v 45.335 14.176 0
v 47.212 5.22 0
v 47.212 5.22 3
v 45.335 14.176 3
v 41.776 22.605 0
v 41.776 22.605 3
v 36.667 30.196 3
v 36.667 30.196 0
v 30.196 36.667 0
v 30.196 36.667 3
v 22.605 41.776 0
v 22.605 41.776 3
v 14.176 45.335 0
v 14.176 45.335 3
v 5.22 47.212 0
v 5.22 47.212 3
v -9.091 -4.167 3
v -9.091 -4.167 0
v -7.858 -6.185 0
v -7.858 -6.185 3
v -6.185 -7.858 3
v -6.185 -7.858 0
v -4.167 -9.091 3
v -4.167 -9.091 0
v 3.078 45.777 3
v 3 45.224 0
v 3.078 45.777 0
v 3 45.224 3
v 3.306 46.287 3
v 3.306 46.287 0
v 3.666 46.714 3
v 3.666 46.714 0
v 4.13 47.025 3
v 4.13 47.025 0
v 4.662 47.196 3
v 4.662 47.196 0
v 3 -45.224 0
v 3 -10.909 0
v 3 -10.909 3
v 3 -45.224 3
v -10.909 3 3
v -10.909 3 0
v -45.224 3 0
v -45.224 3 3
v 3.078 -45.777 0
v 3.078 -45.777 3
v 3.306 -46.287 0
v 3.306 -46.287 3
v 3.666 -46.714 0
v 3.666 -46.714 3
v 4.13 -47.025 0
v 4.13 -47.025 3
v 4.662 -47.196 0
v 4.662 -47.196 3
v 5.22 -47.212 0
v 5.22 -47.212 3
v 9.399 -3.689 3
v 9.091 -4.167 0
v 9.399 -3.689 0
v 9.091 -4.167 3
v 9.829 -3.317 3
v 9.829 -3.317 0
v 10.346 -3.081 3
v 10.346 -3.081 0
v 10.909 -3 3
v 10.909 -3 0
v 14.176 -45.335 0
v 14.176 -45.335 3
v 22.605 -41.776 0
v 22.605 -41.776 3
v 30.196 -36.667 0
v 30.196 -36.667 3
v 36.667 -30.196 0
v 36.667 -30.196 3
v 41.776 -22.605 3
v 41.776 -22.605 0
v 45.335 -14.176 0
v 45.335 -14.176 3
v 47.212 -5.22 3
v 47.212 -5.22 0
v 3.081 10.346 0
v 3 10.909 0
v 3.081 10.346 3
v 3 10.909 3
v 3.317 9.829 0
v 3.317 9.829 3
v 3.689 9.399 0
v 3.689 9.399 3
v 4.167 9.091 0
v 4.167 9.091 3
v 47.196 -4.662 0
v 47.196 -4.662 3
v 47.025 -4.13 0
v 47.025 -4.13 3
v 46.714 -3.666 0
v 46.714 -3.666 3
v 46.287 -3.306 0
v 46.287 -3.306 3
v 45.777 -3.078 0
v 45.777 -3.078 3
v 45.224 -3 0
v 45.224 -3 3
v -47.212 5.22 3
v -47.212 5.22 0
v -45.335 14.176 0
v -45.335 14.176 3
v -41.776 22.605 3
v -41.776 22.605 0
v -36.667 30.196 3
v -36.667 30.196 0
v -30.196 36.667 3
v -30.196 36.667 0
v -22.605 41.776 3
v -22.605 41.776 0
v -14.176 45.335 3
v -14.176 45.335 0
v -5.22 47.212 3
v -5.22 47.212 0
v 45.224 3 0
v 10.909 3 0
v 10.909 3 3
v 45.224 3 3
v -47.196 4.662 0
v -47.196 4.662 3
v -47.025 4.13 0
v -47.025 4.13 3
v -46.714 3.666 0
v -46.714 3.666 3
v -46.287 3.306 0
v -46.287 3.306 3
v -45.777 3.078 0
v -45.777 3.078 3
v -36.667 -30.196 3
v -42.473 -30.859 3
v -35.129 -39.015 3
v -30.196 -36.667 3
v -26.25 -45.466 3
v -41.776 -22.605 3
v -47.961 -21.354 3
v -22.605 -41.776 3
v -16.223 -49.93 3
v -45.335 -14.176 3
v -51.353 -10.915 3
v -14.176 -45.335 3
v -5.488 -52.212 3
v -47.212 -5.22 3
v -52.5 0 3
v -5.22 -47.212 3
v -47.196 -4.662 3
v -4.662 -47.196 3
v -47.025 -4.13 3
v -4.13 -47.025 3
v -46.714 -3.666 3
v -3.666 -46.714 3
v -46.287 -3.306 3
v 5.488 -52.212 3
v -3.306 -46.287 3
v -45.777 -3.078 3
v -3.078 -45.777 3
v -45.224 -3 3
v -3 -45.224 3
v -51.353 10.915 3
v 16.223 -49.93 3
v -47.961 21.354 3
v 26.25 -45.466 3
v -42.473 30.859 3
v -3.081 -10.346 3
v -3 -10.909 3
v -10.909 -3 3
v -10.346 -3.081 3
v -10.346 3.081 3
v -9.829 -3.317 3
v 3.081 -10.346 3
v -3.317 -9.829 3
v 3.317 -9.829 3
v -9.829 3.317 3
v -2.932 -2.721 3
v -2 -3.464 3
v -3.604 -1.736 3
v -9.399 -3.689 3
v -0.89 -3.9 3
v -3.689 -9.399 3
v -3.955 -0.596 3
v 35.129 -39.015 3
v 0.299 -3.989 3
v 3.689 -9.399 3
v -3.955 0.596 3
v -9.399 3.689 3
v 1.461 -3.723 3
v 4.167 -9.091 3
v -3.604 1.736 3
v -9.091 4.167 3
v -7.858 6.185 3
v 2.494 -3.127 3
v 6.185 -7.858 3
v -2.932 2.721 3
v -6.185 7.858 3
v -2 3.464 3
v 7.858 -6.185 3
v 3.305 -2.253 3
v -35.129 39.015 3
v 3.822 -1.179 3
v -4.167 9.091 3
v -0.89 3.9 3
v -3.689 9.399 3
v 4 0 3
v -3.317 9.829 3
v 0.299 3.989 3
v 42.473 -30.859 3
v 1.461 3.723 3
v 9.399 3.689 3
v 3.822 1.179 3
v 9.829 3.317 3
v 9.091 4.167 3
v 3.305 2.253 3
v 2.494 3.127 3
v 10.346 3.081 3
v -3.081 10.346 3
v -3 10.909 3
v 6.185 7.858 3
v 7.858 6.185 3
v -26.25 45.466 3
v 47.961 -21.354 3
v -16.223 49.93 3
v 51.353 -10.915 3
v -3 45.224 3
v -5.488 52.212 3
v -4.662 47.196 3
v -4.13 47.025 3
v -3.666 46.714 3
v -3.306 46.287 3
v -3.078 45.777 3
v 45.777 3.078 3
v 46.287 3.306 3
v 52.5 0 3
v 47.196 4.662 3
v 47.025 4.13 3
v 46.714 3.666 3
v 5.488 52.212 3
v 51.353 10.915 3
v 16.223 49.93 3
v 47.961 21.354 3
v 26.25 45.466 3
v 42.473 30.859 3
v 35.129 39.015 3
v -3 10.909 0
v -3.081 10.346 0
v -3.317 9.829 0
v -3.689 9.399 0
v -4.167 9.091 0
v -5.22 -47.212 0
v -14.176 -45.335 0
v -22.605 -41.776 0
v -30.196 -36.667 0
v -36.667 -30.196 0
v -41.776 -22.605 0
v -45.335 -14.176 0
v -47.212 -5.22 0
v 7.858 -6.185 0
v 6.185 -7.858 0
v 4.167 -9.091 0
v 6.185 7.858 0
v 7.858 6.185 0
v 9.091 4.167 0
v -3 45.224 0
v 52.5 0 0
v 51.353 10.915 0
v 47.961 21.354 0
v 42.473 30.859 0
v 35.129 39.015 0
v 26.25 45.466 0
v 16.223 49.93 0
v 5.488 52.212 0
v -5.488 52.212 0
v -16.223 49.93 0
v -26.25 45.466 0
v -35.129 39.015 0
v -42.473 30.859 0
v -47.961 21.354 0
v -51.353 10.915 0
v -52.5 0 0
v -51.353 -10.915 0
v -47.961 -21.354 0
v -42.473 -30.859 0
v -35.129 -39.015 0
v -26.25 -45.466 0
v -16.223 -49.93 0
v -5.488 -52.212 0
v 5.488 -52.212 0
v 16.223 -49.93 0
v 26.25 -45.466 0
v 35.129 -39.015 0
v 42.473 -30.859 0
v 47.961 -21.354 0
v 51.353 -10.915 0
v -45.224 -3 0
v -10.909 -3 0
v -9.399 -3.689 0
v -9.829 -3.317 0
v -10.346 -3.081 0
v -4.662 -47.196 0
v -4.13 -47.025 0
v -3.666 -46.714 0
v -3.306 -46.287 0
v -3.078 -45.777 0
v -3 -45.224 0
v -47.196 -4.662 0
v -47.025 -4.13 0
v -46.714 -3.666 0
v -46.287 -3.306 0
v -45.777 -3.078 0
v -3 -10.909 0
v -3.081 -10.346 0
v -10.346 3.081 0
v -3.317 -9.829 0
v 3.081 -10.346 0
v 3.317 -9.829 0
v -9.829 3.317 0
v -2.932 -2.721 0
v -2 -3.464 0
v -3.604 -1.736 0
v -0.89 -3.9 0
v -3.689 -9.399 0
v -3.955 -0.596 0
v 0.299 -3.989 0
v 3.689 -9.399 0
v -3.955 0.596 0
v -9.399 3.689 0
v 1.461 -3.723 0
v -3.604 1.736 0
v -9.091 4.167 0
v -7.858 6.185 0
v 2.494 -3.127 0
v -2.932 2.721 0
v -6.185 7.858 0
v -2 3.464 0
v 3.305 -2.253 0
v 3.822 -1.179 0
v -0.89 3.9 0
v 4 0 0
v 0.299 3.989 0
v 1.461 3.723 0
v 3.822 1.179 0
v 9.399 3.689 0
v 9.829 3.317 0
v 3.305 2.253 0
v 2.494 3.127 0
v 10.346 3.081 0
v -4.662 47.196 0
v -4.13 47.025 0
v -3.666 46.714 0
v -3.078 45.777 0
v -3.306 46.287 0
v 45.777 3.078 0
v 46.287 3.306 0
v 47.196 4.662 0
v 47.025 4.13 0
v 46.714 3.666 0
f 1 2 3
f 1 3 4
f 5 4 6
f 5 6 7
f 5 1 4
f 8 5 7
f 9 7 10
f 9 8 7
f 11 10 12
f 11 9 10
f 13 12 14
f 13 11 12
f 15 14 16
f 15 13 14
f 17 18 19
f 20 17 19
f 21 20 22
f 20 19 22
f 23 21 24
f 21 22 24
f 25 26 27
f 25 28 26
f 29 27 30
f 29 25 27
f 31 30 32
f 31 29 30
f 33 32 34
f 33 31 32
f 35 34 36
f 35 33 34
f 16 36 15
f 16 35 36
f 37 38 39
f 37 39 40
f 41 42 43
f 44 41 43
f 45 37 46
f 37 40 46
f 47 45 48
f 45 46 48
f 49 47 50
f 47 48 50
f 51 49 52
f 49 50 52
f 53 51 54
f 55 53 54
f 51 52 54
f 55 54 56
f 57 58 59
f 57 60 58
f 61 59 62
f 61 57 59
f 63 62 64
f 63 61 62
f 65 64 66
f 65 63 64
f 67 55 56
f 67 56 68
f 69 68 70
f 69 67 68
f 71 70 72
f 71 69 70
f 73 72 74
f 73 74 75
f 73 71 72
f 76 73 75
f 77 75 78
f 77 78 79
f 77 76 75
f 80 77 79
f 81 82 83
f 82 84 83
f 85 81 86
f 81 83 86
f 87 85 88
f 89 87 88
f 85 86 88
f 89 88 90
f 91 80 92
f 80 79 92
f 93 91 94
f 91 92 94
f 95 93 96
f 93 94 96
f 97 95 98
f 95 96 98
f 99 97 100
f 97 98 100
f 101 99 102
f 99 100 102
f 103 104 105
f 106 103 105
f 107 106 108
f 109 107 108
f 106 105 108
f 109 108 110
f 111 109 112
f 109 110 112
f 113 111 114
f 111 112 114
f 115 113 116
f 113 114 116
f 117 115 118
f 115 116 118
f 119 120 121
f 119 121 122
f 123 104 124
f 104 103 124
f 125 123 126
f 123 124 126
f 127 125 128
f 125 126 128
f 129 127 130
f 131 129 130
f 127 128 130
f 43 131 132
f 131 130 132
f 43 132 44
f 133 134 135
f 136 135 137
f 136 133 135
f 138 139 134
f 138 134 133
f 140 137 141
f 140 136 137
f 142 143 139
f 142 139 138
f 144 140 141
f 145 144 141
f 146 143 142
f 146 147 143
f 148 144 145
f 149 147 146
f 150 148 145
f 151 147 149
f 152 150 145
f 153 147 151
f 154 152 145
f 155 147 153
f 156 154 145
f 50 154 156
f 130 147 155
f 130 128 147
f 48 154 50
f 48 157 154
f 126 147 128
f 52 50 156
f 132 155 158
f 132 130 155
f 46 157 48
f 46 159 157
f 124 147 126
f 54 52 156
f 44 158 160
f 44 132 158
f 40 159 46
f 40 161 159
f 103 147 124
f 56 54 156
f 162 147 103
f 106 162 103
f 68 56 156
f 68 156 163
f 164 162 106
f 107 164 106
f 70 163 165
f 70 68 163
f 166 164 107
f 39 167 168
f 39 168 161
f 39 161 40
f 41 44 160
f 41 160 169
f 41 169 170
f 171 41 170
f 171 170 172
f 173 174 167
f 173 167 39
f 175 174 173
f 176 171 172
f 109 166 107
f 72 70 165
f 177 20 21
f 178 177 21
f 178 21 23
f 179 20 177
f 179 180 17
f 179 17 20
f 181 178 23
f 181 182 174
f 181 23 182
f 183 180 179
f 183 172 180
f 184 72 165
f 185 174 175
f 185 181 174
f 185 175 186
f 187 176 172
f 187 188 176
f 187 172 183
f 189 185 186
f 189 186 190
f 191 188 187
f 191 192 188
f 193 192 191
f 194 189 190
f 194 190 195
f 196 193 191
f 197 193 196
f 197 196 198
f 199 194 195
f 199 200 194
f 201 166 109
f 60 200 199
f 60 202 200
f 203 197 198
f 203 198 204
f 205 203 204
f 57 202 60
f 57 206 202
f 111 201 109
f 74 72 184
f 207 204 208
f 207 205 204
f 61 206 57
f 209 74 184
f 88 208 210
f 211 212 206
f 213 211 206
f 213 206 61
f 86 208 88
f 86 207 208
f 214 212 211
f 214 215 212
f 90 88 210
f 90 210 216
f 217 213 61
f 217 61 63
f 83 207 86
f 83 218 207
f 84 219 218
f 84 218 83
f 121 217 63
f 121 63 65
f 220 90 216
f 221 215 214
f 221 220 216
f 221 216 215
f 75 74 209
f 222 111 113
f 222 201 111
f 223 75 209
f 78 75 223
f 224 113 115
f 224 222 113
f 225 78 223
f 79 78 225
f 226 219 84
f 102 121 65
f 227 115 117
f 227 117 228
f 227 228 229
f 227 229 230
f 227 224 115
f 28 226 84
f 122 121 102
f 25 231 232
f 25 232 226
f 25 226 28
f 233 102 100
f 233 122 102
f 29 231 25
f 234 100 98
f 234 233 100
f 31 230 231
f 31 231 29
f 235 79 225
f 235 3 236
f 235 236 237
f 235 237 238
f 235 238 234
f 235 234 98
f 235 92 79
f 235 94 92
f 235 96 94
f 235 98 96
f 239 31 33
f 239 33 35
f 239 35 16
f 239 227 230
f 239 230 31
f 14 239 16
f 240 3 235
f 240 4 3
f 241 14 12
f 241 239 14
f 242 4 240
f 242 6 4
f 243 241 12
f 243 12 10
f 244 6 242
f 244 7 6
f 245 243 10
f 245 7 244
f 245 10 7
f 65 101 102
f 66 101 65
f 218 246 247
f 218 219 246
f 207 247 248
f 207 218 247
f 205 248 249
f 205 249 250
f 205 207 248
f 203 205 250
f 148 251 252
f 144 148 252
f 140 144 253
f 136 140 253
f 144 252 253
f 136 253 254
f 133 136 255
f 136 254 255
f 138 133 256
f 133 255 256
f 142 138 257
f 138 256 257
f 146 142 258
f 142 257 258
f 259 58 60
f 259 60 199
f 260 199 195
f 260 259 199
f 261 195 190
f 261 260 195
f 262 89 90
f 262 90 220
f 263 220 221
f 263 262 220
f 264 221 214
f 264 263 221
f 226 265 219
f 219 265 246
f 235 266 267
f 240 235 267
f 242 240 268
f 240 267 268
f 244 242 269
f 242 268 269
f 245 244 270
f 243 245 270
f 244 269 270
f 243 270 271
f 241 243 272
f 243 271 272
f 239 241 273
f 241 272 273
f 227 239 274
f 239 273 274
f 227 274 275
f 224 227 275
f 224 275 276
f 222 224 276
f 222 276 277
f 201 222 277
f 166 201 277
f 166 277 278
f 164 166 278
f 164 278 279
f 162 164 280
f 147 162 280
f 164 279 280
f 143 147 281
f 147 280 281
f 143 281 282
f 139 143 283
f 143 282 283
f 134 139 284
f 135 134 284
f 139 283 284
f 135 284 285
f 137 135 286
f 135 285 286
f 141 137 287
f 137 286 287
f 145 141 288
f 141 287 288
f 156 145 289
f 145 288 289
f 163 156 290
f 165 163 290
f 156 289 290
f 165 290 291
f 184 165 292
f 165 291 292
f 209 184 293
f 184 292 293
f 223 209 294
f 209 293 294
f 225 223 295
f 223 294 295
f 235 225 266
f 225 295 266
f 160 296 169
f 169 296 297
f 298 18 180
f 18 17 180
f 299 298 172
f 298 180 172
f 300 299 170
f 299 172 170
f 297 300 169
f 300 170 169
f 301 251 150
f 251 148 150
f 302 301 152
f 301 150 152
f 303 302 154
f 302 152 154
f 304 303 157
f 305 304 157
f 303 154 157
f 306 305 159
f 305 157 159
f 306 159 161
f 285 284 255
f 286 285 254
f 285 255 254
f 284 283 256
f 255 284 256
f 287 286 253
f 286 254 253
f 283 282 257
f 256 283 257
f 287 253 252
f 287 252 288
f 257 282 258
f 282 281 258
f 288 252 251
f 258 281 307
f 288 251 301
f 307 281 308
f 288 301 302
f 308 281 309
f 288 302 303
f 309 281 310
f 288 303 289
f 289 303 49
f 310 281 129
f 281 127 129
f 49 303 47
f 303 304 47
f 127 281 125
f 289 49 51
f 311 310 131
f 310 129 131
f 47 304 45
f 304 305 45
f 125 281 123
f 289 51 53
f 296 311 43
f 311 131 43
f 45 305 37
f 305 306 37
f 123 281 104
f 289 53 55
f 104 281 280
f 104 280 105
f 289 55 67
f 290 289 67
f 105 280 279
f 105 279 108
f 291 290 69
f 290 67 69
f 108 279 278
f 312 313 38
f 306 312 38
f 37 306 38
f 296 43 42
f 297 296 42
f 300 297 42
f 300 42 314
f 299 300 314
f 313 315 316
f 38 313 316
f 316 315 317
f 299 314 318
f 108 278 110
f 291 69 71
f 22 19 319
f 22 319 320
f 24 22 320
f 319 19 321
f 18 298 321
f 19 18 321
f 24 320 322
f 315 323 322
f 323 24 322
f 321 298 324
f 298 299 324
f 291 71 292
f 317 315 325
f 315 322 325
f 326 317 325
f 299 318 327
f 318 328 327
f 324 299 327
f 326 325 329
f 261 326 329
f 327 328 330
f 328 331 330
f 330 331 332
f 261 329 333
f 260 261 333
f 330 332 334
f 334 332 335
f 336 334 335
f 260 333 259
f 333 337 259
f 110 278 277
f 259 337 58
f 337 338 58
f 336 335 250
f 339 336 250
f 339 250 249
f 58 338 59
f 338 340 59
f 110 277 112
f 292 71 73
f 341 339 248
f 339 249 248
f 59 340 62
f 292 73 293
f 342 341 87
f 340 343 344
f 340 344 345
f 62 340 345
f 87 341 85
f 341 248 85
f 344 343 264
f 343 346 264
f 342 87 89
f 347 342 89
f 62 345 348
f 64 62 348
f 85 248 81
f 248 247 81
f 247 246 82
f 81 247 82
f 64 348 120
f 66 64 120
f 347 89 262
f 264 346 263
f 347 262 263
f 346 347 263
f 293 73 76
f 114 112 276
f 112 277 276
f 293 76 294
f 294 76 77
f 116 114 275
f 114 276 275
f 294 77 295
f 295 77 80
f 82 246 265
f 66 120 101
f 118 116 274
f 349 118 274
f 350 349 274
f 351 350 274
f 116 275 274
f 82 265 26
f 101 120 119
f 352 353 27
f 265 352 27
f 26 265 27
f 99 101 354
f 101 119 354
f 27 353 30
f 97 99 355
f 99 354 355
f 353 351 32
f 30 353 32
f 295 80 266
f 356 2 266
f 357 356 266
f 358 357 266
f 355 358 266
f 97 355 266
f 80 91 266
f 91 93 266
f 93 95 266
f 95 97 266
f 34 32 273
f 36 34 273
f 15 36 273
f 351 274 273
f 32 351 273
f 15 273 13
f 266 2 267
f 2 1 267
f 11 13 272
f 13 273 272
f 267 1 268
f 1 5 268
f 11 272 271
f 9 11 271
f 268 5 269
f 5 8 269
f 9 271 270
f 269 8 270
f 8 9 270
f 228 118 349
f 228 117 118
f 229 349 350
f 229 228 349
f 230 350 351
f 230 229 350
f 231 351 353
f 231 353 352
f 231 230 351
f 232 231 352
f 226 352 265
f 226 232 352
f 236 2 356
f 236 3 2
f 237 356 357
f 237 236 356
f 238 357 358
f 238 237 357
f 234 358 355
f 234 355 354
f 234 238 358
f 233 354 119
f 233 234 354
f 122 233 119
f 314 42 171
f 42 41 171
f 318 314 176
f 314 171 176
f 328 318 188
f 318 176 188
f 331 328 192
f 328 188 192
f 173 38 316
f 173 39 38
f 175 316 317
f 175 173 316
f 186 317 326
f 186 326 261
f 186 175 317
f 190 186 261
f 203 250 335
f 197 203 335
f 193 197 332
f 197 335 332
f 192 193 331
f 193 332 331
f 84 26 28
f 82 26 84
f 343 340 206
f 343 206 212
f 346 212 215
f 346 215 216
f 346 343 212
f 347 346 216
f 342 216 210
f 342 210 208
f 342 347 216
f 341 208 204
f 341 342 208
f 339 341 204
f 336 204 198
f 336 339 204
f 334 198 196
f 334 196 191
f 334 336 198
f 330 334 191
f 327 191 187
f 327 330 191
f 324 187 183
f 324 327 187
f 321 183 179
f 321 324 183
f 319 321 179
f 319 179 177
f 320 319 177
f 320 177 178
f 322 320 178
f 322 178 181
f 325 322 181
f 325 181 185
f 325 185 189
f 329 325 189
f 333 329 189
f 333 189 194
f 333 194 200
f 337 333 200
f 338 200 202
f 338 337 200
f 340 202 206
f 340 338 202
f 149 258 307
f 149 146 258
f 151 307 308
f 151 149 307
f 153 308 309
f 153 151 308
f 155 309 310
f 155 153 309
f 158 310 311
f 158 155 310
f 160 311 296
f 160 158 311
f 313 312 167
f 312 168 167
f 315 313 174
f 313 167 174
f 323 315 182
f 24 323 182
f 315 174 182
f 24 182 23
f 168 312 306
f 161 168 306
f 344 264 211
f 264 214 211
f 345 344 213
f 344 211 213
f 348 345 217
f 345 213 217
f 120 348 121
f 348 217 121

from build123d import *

# Parameters (mm, degrees)
SKETCH_1_R      = 52.5
SKETCH_1_R_2    = 4
EXTRUDE_1_DEPTH = 3
FILLET_1_R      = 2


with BuildPart() as part:
    # 草图1 → 凸台-拉伸1 (new body)
    with BuildSketch(Plane.XY):
        Circle(SKETCH_1_R)
        Circle(SKETCH_1_R_2, mode=Mode.SUBTRACT)
        with BuildLine():
            Line((3, 47.405168495), (3, 9.539392014))
            ThreePointArc((3, 9.539392014), (7.071067812, 7.071067812), (9.539392014, 3))
            Line((9.539392014, 3), (47.405168495, 3))
            ThreePointArc((47.405168495, 3), (33.587572106, 33.587572106), (3, 47.405168495))
        make_face(mode=Mode.SUBTRACT)
        with BuildLine():
            Line((3, -9.539392014), (3, -47.405168495))
            ThreePointArc((3, -47.405168495), (33.587572106, -33.587572106), (47.405168495, -3))
            Line((47.405168495, -3), (9.539392014, -3))
            ThreePointArc((9.539392014, -3), (7.071067812, -7.071067812), (3, -9.539392014))
        make_face(mode=Mode.SUBTRACT)
        with BuildLine():
            Line((-3, 47.405168495), (-3, 9.539392014))
            ThreePointArc((-3, 9.539392014), (-7.071067812, 7.071067812), (-9.539392014, 3))
            Line((-9.539392014, 3), (-47.405168495, 3))
            ThreePointArc((-47.405168495, 3), (-33.587572106, 33.587572106), (-3, 47.405168495))
        make_face(mode=Mode.SUBTRACT)
        with BuildLine():
            Line((-47.405168495, -3), (-9.539392014, -3))
            ThreePointArc((-9.539392014, -3), (-7.071067812, -7.071067812), (-3, -9.539392014))
            Line((-3, -9.539392014), (-3, -47.405168495))
            ThreePointArc((-3, -47.405168495), (-33.587572106, -33.587572106), (-47.405168495, -3))
        make_face(mode=Mode.SUBTRACT)
    extrude(amount=EXTRUDE_1_DEPTH)

    # 圆角1
    fillet_1_edges = [part.edges().sort_by_distance(p)[0] for p in [
        (-3, 47.405168495, 1.5),
        (-47.405168495, 3, 1.5),
        (-9.539392014, 3, 1.5),
        (-3, 9.539392014, 1.5),
        (3, -47.405168495, 1.5),
        (47.405168495, -3, 1.5),
        (9.539392014, -3, 1.5),
        (3, -9.539392014, 1.5),
        (-47.405168495, -3, 1.5),
        (-3, -47.405168495, 1.5),
        (-3, -9.539392014, 1.5),
        (-9.539392014, -3, 1.5),
        (3, 9.539392014, 1.5),
        (9.539392014, 3, 1.5),
        (47.405168495, 3, 1.5),
        (3, 47.405168495, 1.5),
    ]]
    fillet(fillet_1_edges, radius=FILLET_1_R)


solid = part.part
